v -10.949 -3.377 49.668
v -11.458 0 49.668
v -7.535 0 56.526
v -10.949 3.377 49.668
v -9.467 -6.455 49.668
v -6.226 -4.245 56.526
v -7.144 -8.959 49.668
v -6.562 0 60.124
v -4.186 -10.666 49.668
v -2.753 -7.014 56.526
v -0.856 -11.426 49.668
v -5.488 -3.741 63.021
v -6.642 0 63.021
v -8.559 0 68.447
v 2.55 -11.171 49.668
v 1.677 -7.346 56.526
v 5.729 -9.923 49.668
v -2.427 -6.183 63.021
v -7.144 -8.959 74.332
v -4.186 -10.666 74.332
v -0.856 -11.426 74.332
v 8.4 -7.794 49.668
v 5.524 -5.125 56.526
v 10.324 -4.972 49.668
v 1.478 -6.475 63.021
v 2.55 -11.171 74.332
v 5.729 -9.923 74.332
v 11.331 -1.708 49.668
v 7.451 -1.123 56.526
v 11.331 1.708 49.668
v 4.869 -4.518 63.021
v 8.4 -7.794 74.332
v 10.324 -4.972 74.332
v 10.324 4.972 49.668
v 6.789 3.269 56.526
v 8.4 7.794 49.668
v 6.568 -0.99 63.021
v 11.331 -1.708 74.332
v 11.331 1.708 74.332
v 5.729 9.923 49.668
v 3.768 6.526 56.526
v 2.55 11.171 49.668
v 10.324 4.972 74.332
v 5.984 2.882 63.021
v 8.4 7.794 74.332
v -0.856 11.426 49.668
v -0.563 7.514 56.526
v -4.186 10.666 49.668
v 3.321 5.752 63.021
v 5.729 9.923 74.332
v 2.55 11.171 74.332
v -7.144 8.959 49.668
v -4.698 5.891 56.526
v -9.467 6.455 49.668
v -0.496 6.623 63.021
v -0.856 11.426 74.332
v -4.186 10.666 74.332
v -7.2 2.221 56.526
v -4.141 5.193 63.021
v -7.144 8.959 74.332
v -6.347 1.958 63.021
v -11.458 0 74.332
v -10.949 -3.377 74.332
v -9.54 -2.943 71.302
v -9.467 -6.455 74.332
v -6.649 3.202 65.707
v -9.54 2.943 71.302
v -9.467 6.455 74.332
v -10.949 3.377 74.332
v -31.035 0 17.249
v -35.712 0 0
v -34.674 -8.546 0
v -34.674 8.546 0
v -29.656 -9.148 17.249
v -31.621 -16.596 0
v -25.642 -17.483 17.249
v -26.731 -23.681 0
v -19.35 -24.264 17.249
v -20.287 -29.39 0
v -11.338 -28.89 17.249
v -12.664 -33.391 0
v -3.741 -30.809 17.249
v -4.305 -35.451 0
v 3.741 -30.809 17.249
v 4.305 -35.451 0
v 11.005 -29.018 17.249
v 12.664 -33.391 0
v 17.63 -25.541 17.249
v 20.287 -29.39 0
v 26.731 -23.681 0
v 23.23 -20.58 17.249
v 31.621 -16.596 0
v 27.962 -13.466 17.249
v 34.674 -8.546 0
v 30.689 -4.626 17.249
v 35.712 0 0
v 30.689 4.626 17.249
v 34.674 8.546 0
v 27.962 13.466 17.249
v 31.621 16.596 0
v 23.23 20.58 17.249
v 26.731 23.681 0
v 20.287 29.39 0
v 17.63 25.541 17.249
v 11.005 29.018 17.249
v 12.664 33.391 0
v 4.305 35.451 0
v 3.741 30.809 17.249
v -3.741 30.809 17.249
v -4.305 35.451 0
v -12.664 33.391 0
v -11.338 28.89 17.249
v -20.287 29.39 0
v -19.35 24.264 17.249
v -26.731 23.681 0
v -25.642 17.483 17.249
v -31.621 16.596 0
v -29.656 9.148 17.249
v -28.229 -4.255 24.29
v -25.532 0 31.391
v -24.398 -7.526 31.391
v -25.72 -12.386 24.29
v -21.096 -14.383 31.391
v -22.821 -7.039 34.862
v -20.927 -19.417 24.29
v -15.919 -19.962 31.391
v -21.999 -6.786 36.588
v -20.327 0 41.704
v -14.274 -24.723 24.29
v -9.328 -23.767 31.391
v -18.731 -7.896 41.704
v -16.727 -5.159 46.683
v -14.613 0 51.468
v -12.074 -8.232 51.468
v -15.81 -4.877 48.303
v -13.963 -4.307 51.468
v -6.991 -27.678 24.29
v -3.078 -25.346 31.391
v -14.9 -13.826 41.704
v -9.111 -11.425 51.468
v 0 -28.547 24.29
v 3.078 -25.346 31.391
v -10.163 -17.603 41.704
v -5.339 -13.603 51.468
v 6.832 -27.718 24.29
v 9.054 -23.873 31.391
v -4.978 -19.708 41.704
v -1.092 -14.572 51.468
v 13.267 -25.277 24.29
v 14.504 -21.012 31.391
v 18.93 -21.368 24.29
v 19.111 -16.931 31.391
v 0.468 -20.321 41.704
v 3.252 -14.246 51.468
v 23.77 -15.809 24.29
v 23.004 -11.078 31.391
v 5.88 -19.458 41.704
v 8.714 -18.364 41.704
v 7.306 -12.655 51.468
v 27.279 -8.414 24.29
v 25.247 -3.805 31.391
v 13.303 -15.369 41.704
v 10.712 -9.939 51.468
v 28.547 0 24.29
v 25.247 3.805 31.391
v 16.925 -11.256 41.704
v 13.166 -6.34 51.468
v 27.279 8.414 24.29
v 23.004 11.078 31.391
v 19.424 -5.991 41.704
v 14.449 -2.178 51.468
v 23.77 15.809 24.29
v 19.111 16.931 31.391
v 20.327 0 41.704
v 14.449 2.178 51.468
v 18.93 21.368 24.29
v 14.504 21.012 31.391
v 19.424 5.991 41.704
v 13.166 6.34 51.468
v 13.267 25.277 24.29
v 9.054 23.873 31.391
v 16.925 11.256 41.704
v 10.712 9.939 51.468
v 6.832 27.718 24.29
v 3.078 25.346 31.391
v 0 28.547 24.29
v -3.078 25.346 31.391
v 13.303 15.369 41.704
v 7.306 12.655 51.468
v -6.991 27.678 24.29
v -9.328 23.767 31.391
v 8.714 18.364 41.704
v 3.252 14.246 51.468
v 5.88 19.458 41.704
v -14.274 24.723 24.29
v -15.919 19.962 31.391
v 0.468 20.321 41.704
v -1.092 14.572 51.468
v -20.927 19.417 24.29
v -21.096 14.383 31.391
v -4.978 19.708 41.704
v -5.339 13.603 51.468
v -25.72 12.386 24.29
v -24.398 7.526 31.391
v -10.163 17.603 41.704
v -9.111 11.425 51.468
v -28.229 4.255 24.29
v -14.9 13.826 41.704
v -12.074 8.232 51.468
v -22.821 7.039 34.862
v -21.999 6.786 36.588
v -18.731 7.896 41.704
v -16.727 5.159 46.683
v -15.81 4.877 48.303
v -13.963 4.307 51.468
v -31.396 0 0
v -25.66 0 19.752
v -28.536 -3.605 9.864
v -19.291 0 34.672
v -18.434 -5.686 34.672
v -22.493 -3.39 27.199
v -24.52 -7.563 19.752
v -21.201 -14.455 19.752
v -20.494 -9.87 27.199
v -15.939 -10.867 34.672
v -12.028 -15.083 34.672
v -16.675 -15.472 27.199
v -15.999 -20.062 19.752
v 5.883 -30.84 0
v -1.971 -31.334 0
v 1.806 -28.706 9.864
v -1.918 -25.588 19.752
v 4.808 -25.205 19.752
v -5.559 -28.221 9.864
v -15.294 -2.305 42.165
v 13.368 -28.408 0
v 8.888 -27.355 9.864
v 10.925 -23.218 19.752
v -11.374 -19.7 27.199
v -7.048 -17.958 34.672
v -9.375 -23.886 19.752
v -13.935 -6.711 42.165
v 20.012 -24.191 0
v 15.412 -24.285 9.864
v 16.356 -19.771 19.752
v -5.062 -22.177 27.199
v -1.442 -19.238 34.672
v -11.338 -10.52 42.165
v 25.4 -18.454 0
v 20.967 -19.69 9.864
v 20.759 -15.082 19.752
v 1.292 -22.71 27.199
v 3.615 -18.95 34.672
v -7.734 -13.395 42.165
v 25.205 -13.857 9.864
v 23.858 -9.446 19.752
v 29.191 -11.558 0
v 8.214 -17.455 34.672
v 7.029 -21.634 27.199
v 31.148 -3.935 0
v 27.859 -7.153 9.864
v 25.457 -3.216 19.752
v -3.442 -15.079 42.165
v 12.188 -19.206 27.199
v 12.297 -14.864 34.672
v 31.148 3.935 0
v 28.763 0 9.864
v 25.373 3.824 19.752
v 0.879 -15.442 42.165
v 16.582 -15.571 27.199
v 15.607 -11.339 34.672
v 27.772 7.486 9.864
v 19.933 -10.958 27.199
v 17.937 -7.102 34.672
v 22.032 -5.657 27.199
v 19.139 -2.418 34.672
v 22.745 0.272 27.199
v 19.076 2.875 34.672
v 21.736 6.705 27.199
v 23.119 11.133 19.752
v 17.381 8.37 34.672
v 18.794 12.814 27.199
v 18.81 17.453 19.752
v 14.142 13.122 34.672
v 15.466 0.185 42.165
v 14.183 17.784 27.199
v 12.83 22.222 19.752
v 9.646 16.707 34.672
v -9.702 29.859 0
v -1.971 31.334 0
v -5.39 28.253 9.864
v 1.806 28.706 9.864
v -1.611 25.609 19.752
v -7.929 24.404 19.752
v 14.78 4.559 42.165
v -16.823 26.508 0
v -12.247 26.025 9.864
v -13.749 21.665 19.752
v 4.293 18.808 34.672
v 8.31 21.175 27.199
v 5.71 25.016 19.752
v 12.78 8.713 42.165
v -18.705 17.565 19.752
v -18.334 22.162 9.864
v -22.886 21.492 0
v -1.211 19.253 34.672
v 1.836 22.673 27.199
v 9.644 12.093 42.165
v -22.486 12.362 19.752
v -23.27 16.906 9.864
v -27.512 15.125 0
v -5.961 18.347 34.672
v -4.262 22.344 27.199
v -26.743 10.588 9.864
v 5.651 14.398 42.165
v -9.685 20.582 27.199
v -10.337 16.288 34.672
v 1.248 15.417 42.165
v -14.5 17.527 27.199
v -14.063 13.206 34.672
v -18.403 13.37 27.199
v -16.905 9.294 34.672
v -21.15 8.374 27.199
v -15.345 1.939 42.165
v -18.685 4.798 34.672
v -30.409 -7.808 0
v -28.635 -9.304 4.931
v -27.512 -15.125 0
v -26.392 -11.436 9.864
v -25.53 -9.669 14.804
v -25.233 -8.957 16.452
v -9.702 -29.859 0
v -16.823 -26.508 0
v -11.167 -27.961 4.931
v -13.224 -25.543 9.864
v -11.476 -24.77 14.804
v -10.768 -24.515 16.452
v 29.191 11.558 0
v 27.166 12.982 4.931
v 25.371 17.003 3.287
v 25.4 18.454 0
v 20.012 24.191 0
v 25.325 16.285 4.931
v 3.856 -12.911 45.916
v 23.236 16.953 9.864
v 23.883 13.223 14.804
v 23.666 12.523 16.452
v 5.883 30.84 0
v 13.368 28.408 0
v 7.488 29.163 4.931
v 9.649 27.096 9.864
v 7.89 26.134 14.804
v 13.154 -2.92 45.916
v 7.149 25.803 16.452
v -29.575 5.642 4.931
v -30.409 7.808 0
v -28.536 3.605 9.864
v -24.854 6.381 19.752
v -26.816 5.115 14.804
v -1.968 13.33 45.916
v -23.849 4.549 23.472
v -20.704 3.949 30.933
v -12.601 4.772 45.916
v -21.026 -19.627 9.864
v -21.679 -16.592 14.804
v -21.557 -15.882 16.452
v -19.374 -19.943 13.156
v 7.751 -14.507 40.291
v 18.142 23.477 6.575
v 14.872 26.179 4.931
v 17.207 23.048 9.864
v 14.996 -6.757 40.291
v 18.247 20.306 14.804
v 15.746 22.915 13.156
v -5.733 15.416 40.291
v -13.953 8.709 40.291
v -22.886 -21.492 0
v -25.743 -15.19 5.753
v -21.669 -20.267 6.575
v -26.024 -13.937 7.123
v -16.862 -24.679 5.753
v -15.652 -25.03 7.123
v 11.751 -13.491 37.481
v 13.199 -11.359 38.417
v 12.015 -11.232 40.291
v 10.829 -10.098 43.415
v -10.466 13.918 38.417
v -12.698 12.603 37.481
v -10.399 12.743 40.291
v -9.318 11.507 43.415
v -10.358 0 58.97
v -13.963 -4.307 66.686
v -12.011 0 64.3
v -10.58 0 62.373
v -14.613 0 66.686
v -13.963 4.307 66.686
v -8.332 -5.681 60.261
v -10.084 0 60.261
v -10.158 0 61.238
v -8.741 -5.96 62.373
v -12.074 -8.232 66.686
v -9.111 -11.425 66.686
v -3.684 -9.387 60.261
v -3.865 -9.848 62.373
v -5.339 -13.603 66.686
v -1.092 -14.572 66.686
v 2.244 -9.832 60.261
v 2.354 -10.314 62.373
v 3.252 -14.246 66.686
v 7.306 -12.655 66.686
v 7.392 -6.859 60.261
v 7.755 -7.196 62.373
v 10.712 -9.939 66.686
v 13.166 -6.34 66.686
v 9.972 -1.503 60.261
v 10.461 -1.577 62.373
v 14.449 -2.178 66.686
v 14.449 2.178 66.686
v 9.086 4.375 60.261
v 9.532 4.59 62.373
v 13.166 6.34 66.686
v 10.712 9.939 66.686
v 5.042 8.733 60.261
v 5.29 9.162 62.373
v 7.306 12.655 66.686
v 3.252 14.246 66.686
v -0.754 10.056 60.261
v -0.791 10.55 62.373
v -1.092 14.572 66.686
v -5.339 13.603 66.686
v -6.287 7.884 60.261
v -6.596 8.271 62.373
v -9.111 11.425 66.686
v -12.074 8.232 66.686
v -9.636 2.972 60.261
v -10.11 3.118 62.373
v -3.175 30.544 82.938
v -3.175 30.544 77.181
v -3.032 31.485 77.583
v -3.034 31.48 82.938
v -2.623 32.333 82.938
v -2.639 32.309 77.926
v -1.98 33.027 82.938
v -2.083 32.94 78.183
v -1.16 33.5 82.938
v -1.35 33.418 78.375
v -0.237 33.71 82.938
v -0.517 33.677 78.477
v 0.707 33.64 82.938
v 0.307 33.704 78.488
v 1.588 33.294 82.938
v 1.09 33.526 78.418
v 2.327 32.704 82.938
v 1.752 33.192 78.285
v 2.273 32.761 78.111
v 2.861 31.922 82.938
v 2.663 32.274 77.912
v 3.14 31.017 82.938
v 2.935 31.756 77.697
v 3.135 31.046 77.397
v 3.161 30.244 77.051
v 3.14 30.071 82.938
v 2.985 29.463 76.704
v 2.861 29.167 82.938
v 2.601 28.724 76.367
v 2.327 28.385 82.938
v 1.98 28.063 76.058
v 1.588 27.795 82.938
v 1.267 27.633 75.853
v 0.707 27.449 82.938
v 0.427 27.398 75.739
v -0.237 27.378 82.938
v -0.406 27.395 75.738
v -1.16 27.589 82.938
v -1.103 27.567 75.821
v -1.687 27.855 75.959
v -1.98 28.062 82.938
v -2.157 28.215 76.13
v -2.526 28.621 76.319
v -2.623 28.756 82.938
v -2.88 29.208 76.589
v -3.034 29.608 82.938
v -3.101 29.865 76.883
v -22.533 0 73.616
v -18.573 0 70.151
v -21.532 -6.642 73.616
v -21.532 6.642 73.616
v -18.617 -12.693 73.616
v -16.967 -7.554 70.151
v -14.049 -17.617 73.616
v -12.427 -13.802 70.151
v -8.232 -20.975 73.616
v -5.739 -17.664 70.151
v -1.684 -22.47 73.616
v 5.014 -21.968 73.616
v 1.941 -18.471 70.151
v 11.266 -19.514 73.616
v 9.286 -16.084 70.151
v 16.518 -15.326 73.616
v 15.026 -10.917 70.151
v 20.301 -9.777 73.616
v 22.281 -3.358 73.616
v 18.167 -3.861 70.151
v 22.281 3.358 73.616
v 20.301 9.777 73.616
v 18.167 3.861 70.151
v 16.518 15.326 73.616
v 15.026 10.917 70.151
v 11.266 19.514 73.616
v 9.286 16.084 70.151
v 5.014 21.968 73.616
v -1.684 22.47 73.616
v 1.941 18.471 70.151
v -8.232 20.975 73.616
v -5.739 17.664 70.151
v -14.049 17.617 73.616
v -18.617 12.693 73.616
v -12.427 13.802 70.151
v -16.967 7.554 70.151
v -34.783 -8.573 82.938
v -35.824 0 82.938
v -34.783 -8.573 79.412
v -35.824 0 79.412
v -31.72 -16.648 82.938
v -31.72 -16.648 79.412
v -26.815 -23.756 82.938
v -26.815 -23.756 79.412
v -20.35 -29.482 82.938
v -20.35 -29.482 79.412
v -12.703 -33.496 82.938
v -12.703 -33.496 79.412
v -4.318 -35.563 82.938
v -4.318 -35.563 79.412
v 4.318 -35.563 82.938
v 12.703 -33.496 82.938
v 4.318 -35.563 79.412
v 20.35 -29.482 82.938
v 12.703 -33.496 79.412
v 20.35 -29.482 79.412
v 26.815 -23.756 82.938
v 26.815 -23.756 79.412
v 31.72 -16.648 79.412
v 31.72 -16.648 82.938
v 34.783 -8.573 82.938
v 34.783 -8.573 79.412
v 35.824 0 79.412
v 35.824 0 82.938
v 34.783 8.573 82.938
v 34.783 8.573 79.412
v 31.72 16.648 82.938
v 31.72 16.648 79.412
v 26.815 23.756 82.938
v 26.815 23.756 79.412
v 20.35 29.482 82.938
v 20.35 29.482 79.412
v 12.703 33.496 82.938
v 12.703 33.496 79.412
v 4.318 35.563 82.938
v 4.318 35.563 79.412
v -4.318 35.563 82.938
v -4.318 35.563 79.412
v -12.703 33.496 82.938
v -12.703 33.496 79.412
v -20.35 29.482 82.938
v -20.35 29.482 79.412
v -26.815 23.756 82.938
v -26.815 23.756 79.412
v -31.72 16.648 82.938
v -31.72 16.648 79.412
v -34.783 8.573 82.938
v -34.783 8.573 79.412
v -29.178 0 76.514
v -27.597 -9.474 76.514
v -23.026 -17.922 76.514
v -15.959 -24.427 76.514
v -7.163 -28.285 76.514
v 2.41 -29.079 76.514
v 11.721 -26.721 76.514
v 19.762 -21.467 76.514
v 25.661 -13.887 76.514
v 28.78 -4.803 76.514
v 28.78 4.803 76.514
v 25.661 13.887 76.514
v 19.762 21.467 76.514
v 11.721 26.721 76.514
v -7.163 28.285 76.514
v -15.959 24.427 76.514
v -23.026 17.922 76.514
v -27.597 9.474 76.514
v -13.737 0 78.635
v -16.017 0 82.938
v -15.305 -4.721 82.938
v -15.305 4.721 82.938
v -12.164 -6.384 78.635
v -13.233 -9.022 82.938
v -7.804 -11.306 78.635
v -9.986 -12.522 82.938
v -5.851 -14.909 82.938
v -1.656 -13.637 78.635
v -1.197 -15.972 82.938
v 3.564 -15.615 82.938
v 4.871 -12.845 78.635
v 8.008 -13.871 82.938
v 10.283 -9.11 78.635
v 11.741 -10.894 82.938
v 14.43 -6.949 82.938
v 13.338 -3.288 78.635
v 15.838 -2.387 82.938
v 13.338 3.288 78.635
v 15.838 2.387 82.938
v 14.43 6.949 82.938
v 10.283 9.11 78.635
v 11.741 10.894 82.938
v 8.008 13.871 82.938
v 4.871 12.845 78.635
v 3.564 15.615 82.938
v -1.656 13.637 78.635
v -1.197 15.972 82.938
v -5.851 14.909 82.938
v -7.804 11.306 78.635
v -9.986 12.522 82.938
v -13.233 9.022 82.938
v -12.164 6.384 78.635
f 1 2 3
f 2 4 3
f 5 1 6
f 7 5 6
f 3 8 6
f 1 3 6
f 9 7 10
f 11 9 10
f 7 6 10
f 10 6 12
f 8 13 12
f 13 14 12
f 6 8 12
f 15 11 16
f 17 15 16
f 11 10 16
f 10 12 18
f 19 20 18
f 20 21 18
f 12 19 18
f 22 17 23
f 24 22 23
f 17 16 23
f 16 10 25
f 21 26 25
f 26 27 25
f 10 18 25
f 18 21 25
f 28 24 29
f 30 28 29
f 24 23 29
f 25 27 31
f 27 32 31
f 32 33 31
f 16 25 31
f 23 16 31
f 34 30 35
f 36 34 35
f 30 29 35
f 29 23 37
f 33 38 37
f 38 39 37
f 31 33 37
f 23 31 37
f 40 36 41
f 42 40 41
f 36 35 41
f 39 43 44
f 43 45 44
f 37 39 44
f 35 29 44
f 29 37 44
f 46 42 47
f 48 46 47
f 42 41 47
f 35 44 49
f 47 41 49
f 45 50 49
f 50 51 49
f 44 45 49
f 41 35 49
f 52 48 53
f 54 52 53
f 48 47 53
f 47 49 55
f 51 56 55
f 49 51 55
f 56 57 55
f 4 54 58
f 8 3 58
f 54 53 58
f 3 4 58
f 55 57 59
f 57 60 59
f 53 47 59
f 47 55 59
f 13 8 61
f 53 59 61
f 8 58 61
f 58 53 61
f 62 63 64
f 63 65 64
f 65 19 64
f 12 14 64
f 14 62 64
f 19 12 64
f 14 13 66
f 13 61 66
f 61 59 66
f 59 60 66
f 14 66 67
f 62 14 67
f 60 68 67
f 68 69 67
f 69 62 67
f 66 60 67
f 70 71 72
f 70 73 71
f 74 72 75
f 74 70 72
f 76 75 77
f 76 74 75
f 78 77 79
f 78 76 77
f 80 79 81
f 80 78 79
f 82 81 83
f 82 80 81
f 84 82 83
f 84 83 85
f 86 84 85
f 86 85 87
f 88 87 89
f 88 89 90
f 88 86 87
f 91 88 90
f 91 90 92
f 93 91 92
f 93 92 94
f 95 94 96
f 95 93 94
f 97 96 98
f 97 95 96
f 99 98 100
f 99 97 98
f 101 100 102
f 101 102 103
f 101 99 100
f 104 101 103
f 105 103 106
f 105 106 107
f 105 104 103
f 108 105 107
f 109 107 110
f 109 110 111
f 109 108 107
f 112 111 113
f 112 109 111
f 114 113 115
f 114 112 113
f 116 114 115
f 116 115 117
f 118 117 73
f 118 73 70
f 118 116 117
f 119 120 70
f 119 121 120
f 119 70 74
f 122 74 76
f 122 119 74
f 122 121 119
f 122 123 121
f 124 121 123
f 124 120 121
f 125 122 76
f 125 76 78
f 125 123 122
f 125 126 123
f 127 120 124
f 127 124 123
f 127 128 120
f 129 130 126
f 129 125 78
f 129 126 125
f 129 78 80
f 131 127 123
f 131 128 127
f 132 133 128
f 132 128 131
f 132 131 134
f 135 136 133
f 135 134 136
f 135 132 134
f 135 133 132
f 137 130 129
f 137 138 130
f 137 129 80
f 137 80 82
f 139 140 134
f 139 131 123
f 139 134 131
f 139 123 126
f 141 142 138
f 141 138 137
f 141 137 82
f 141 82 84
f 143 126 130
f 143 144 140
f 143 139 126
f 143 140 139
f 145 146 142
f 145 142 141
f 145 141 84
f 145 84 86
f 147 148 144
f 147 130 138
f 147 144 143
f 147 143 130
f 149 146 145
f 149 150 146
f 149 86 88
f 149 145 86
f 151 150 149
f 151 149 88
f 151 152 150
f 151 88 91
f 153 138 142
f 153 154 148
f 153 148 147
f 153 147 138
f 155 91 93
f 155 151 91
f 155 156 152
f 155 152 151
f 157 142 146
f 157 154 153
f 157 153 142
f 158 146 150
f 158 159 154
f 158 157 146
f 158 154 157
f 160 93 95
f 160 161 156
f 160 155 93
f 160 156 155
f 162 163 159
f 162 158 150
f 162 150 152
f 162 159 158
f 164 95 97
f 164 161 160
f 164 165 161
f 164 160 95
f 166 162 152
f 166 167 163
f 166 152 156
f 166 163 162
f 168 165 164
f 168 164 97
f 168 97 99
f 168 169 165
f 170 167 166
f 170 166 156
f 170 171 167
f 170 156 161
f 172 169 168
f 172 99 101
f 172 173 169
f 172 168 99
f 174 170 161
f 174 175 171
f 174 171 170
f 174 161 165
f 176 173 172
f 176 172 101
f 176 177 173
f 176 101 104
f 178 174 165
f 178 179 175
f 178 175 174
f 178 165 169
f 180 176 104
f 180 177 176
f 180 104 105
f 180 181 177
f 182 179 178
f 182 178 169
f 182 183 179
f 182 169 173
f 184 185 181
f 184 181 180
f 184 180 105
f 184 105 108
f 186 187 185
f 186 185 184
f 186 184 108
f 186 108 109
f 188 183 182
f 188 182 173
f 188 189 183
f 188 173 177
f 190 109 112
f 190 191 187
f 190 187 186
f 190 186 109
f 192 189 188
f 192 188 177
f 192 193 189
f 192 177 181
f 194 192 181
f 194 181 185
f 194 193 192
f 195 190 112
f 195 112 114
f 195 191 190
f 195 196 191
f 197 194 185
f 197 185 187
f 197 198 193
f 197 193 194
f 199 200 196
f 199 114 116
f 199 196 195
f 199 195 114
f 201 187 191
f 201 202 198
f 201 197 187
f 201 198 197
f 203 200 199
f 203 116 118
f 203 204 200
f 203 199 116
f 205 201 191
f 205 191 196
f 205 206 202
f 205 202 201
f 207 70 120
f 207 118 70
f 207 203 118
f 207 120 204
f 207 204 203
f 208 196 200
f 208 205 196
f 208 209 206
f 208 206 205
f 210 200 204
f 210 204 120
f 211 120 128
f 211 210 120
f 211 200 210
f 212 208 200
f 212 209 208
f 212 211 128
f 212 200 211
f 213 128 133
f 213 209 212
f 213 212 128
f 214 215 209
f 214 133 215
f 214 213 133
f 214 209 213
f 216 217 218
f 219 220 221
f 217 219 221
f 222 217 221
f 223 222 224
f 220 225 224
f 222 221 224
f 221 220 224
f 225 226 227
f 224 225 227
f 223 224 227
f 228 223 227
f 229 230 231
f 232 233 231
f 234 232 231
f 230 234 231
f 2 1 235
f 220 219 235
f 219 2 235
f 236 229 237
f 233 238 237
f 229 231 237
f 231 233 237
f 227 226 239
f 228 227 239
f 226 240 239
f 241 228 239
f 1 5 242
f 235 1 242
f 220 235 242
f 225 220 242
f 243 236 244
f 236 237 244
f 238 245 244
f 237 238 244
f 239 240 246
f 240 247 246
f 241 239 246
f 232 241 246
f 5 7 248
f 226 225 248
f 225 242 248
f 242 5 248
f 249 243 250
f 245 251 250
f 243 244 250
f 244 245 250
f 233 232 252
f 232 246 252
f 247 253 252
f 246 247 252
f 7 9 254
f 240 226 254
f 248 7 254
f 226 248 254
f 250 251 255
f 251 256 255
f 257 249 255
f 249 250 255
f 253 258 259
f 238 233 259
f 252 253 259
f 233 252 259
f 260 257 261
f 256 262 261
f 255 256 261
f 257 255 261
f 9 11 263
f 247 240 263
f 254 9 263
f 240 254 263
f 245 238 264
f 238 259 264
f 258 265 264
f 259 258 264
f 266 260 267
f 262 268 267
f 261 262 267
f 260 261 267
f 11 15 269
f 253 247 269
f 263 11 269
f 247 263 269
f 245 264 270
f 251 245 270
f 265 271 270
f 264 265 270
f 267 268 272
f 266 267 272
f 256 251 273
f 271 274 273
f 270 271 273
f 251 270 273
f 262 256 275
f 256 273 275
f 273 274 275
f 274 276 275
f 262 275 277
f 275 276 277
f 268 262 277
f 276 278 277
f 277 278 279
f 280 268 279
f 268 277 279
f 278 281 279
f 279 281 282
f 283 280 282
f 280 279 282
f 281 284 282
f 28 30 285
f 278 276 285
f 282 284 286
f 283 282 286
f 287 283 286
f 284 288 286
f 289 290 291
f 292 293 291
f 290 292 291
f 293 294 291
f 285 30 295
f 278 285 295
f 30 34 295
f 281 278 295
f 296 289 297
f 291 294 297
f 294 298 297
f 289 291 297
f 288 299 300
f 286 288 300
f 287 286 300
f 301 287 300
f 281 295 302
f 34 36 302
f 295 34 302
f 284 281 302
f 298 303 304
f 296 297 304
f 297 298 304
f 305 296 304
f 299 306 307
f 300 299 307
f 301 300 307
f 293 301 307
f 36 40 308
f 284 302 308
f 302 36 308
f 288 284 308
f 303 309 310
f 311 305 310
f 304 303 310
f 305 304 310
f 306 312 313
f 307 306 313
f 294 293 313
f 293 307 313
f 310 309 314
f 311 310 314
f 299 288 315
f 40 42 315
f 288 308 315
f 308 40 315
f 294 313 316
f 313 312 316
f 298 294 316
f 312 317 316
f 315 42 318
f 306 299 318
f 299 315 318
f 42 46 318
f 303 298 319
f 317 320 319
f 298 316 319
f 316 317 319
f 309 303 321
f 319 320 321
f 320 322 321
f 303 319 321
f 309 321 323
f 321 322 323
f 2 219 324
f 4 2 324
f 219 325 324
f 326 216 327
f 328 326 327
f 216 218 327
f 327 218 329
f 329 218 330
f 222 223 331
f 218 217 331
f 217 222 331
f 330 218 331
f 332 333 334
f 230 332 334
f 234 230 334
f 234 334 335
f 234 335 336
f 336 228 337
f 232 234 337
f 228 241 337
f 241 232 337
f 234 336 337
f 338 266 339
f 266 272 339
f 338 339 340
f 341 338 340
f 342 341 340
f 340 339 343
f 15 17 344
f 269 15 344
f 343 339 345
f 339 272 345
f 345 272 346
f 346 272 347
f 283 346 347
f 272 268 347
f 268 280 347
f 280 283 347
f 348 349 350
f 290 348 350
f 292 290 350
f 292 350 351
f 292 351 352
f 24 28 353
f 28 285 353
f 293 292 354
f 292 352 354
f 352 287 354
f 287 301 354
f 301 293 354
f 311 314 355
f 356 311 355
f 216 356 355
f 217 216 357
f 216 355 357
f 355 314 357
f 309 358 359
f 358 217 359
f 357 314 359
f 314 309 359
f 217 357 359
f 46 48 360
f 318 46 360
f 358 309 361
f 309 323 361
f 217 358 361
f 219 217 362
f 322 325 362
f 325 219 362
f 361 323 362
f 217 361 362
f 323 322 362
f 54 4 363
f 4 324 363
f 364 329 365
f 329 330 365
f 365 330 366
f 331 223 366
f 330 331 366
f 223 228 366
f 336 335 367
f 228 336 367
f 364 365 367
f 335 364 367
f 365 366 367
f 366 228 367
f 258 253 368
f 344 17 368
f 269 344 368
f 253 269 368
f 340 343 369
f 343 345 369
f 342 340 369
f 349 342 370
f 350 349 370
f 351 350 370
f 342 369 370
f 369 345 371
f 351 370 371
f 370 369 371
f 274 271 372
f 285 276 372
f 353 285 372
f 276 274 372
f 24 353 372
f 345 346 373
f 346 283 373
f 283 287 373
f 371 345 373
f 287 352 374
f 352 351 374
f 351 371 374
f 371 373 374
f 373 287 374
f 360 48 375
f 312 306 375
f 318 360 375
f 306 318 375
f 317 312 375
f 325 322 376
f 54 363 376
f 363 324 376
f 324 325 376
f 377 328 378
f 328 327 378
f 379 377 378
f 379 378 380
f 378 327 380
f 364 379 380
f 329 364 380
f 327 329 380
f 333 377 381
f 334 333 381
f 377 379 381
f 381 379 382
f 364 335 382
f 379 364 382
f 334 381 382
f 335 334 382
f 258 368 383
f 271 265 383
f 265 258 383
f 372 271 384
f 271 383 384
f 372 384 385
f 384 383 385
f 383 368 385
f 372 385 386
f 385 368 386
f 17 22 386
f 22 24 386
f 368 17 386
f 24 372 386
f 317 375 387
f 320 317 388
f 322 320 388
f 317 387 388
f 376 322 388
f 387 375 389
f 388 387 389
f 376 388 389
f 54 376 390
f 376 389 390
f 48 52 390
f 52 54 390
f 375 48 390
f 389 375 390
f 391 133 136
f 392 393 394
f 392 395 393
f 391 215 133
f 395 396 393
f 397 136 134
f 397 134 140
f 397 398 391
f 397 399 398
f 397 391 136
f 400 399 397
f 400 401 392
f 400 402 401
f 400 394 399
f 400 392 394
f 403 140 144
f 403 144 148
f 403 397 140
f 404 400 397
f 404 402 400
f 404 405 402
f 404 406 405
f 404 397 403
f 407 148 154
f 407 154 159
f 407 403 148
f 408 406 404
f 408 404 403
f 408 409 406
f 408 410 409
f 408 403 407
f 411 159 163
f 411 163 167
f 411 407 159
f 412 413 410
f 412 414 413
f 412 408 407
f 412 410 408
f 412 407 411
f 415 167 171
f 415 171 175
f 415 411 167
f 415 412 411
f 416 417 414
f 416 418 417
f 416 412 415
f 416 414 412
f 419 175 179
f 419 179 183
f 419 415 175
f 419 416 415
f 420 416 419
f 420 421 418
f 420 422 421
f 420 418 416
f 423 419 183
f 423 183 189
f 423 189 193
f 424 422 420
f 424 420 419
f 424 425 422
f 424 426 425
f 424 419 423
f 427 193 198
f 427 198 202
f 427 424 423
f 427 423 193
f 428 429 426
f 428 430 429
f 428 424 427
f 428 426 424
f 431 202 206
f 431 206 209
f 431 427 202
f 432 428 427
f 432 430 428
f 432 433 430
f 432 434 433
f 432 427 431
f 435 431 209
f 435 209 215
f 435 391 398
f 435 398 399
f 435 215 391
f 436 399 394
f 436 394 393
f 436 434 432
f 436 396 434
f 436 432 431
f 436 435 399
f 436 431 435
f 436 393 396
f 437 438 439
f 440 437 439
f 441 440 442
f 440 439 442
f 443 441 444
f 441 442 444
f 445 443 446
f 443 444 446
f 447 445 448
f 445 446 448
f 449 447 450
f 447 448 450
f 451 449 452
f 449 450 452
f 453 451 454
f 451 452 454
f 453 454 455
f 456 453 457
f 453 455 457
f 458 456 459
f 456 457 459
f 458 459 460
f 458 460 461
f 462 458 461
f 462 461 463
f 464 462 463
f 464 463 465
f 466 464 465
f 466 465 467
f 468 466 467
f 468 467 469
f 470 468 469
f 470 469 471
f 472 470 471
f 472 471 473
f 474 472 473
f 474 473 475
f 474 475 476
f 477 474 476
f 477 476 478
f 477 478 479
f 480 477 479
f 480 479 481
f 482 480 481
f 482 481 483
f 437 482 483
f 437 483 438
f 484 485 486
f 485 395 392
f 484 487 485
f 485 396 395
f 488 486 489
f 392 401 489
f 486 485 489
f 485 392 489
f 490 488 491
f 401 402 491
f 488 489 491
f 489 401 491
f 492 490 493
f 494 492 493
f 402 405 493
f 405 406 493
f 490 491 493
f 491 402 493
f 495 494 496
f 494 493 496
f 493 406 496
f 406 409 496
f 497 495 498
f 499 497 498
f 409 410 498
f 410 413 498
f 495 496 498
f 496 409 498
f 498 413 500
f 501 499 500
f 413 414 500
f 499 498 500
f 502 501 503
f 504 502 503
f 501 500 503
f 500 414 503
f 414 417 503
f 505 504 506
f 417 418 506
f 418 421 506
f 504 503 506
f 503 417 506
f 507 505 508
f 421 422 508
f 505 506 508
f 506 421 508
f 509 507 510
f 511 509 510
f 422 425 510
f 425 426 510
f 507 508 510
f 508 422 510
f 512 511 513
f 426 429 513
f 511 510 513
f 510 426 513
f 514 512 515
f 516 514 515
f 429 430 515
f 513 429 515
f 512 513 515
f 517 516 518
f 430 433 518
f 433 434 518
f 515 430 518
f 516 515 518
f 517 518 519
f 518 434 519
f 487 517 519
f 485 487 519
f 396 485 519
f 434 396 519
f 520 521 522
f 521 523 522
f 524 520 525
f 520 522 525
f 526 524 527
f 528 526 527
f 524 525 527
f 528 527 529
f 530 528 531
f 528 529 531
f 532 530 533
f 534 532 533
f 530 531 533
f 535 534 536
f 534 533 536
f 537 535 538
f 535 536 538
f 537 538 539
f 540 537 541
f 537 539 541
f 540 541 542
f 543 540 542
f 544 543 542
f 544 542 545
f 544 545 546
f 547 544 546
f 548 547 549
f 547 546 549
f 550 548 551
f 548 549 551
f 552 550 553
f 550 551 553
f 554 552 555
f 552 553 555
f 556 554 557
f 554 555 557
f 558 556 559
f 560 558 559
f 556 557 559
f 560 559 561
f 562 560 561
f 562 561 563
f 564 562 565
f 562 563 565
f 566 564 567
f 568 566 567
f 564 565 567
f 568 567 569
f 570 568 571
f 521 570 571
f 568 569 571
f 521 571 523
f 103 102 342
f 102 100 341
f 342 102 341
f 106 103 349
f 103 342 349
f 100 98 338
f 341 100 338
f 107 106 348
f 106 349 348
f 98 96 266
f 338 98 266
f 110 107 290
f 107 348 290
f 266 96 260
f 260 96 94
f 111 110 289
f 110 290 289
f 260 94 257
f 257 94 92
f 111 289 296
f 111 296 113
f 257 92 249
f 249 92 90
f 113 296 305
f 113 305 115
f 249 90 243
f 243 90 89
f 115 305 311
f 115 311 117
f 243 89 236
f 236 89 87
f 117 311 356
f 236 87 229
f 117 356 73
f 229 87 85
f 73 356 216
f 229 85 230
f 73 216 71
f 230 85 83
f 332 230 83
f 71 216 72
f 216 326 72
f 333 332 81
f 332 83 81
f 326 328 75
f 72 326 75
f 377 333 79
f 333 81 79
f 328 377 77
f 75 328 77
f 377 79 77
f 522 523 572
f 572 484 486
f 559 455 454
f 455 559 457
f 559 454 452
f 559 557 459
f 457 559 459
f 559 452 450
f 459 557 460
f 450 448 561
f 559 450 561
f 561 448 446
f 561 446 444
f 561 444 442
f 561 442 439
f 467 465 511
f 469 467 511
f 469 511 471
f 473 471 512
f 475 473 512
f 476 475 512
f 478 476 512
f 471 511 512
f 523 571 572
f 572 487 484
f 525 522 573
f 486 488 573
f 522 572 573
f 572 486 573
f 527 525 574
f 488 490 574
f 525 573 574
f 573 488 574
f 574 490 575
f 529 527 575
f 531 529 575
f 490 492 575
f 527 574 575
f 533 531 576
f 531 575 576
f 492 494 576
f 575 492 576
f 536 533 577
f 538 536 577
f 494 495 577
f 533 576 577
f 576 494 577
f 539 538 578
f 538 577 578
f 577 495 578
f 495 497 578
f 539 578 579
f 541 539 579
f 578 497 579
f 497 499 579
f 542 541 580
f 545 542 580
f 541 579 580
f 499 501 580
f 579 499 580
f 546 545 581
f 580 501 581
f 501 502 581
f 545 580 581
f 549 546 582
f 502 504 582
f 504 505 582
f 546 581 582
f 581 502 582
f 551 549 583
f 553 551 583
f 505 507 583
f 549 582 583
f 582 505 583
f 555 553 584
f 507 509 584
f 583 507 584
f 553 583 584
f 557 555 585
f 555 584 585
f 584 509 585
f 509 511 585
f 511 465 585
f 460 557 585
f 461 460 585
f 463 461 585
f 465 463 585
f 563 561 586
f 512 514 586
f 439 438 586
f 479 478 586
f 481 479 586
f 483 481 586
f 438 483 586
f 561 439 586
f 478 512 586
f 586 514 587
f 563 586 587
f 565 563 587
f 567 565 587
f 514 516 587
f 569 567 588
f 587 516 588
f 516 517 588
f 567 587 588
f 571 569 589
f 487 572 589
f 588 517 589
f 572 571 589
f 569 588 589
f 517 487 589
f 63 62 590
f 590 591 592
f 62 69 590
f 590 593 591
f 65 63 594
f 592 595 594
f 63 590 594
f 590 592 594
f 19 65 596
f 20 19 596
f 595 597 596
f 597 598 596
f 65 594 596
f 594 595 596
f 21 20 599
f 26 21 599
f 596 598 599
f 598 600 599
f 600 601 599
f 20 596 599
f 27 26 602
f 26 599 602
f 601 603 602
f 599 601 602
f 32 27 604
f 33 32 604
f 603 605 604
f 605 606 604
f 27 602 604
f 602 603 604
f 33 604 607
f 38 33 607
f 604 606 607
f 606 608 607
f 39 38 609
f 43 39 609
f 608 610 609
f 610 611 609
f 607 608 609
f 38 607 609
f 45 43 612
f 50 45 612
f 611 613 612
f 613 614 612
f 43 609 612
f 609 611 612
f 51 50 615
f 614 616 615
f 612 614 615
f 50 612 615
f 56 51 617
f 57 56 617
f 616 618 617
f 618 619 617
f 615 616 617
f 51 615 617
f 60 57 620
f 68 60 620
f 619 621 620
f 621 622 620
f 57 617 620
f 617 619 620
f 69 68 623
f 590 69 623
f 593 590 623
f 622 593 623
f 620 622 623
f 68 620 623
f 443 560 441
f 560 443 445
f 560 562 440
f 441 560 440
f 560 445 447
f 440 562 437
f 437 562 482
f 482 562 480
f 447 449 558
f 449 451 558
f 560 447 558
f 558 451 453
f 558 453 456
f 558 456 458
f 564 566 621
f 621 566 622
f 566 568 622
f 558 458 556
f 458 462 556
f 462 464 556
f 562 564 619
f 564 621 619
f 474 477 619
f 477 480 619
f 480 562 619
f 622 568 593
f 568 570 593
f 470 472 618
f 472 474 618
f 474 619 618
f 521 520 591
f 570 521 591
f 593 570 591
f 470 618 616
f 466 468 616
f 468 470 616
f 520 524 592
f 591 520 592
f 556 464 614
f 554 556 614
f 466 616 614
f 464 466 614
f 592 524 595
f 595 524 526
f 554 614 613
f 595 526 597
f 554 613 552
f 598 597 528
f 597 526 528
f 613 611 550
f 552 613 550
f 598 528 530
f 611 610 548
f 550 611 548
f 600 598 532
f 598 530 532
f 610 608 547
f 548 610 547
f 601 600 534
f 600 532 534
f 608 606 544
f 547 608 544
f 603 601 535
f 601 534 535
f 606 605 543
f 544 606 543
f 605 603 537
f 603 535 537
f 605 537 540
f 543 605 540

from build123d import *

# Parameters (mm, degrees)
F4_D     = 6.35
F4_DEPTH = 12.7
F4_TIP   = 1.9077324654


with BuildPart() as f1:
    # F0 (on Front) → F1 (revolve)
    with BuildSketch(Plane.XZ):
        with BuildLine():
            add(Edge.make_bspline(
                [(-35.711620003, 0), (-33.6991355754, 8.3739323563), (-29.3174594603, 25.4988872735), (-19.6445835619, 43.3868067126), (-14.6126173957, 51.4680505725)],
                knots=[0, 0, 0, 0, 0.4850144004, 1, 1, 1, 1], degree=3))
            Line((-35.711620003, 0), (-31.3956774771, 0))
            add(Edge.make_bspline(
                [(-31.3956774771, 0), (-29.3449089655, 7.9159356711), (-25.0874906142, 24.3495041979), (-16.1110445435, 41.0247078901), (-11.4584900439, 49.6675819159)],
                knots=[0, 0, 0, 0, 0.4816930958, 1, 1, 1, 1], degree=3))
            add(Edge.make_bspline(
                [(-11.4584900439, 49.6675819159), (-9.2111257589, 52.9541958774), (-3.7759486318, 61.5209078018), (-9.2010886072, 69.393788099), (-11.4584900439, 74.3316113949)],
                knots=[0, 0, 0, 0, 0.4840360956, 1, 1, 1, 1], degree=3))
            Line((-11.4584900439, 74.3316113949), (-16.0165019333, 82.9376876354))
            Line((-16.0165019333, 82.9376876354), (-35.8239077032, 82.9376876354))
            Line((-35.8239077032, 82.9376876354), (-35.8239077032, 79.4118791819))
            Line((-35.8239077032, 79.4118791819), (-22.5325617939, 73.6162364483))
            Line((-22.5325617939, 73.6162364483), (-14.6126173957, 66.6863429164))
            add(Edge.make_bspline(
                [(-14.6126173957, 51.4680505725), (-12.1953186939, 55.8042941924), (-8.853870956, 59.7288834218), (-10.7295096303, 63.5019995765), (-14.6126173957, 66.6863429164)],
                knots=[0, 0, 0, 0, 0.5184258095, 1, 1, 1, 1], degree=3))
        make_face()
    revolve(axis=Axis((0, 0, 6.4593851566), (0, 0, 1)))

    # F4
    with Locations(Plane.XY.offset(82.9376876354)):
        with Locations((0, 30.5442549288)):
            Hole(F4_D / 2, depth=F4_DEPTH)
            with Locations((0, 0, -(F4_DEPTH + F4_TIP / 2))):  # 118° drill point
                Cone(0, F4_D / 2, F4_TIP, mode=Mode.SUBTRACT)


solid = f1.part
